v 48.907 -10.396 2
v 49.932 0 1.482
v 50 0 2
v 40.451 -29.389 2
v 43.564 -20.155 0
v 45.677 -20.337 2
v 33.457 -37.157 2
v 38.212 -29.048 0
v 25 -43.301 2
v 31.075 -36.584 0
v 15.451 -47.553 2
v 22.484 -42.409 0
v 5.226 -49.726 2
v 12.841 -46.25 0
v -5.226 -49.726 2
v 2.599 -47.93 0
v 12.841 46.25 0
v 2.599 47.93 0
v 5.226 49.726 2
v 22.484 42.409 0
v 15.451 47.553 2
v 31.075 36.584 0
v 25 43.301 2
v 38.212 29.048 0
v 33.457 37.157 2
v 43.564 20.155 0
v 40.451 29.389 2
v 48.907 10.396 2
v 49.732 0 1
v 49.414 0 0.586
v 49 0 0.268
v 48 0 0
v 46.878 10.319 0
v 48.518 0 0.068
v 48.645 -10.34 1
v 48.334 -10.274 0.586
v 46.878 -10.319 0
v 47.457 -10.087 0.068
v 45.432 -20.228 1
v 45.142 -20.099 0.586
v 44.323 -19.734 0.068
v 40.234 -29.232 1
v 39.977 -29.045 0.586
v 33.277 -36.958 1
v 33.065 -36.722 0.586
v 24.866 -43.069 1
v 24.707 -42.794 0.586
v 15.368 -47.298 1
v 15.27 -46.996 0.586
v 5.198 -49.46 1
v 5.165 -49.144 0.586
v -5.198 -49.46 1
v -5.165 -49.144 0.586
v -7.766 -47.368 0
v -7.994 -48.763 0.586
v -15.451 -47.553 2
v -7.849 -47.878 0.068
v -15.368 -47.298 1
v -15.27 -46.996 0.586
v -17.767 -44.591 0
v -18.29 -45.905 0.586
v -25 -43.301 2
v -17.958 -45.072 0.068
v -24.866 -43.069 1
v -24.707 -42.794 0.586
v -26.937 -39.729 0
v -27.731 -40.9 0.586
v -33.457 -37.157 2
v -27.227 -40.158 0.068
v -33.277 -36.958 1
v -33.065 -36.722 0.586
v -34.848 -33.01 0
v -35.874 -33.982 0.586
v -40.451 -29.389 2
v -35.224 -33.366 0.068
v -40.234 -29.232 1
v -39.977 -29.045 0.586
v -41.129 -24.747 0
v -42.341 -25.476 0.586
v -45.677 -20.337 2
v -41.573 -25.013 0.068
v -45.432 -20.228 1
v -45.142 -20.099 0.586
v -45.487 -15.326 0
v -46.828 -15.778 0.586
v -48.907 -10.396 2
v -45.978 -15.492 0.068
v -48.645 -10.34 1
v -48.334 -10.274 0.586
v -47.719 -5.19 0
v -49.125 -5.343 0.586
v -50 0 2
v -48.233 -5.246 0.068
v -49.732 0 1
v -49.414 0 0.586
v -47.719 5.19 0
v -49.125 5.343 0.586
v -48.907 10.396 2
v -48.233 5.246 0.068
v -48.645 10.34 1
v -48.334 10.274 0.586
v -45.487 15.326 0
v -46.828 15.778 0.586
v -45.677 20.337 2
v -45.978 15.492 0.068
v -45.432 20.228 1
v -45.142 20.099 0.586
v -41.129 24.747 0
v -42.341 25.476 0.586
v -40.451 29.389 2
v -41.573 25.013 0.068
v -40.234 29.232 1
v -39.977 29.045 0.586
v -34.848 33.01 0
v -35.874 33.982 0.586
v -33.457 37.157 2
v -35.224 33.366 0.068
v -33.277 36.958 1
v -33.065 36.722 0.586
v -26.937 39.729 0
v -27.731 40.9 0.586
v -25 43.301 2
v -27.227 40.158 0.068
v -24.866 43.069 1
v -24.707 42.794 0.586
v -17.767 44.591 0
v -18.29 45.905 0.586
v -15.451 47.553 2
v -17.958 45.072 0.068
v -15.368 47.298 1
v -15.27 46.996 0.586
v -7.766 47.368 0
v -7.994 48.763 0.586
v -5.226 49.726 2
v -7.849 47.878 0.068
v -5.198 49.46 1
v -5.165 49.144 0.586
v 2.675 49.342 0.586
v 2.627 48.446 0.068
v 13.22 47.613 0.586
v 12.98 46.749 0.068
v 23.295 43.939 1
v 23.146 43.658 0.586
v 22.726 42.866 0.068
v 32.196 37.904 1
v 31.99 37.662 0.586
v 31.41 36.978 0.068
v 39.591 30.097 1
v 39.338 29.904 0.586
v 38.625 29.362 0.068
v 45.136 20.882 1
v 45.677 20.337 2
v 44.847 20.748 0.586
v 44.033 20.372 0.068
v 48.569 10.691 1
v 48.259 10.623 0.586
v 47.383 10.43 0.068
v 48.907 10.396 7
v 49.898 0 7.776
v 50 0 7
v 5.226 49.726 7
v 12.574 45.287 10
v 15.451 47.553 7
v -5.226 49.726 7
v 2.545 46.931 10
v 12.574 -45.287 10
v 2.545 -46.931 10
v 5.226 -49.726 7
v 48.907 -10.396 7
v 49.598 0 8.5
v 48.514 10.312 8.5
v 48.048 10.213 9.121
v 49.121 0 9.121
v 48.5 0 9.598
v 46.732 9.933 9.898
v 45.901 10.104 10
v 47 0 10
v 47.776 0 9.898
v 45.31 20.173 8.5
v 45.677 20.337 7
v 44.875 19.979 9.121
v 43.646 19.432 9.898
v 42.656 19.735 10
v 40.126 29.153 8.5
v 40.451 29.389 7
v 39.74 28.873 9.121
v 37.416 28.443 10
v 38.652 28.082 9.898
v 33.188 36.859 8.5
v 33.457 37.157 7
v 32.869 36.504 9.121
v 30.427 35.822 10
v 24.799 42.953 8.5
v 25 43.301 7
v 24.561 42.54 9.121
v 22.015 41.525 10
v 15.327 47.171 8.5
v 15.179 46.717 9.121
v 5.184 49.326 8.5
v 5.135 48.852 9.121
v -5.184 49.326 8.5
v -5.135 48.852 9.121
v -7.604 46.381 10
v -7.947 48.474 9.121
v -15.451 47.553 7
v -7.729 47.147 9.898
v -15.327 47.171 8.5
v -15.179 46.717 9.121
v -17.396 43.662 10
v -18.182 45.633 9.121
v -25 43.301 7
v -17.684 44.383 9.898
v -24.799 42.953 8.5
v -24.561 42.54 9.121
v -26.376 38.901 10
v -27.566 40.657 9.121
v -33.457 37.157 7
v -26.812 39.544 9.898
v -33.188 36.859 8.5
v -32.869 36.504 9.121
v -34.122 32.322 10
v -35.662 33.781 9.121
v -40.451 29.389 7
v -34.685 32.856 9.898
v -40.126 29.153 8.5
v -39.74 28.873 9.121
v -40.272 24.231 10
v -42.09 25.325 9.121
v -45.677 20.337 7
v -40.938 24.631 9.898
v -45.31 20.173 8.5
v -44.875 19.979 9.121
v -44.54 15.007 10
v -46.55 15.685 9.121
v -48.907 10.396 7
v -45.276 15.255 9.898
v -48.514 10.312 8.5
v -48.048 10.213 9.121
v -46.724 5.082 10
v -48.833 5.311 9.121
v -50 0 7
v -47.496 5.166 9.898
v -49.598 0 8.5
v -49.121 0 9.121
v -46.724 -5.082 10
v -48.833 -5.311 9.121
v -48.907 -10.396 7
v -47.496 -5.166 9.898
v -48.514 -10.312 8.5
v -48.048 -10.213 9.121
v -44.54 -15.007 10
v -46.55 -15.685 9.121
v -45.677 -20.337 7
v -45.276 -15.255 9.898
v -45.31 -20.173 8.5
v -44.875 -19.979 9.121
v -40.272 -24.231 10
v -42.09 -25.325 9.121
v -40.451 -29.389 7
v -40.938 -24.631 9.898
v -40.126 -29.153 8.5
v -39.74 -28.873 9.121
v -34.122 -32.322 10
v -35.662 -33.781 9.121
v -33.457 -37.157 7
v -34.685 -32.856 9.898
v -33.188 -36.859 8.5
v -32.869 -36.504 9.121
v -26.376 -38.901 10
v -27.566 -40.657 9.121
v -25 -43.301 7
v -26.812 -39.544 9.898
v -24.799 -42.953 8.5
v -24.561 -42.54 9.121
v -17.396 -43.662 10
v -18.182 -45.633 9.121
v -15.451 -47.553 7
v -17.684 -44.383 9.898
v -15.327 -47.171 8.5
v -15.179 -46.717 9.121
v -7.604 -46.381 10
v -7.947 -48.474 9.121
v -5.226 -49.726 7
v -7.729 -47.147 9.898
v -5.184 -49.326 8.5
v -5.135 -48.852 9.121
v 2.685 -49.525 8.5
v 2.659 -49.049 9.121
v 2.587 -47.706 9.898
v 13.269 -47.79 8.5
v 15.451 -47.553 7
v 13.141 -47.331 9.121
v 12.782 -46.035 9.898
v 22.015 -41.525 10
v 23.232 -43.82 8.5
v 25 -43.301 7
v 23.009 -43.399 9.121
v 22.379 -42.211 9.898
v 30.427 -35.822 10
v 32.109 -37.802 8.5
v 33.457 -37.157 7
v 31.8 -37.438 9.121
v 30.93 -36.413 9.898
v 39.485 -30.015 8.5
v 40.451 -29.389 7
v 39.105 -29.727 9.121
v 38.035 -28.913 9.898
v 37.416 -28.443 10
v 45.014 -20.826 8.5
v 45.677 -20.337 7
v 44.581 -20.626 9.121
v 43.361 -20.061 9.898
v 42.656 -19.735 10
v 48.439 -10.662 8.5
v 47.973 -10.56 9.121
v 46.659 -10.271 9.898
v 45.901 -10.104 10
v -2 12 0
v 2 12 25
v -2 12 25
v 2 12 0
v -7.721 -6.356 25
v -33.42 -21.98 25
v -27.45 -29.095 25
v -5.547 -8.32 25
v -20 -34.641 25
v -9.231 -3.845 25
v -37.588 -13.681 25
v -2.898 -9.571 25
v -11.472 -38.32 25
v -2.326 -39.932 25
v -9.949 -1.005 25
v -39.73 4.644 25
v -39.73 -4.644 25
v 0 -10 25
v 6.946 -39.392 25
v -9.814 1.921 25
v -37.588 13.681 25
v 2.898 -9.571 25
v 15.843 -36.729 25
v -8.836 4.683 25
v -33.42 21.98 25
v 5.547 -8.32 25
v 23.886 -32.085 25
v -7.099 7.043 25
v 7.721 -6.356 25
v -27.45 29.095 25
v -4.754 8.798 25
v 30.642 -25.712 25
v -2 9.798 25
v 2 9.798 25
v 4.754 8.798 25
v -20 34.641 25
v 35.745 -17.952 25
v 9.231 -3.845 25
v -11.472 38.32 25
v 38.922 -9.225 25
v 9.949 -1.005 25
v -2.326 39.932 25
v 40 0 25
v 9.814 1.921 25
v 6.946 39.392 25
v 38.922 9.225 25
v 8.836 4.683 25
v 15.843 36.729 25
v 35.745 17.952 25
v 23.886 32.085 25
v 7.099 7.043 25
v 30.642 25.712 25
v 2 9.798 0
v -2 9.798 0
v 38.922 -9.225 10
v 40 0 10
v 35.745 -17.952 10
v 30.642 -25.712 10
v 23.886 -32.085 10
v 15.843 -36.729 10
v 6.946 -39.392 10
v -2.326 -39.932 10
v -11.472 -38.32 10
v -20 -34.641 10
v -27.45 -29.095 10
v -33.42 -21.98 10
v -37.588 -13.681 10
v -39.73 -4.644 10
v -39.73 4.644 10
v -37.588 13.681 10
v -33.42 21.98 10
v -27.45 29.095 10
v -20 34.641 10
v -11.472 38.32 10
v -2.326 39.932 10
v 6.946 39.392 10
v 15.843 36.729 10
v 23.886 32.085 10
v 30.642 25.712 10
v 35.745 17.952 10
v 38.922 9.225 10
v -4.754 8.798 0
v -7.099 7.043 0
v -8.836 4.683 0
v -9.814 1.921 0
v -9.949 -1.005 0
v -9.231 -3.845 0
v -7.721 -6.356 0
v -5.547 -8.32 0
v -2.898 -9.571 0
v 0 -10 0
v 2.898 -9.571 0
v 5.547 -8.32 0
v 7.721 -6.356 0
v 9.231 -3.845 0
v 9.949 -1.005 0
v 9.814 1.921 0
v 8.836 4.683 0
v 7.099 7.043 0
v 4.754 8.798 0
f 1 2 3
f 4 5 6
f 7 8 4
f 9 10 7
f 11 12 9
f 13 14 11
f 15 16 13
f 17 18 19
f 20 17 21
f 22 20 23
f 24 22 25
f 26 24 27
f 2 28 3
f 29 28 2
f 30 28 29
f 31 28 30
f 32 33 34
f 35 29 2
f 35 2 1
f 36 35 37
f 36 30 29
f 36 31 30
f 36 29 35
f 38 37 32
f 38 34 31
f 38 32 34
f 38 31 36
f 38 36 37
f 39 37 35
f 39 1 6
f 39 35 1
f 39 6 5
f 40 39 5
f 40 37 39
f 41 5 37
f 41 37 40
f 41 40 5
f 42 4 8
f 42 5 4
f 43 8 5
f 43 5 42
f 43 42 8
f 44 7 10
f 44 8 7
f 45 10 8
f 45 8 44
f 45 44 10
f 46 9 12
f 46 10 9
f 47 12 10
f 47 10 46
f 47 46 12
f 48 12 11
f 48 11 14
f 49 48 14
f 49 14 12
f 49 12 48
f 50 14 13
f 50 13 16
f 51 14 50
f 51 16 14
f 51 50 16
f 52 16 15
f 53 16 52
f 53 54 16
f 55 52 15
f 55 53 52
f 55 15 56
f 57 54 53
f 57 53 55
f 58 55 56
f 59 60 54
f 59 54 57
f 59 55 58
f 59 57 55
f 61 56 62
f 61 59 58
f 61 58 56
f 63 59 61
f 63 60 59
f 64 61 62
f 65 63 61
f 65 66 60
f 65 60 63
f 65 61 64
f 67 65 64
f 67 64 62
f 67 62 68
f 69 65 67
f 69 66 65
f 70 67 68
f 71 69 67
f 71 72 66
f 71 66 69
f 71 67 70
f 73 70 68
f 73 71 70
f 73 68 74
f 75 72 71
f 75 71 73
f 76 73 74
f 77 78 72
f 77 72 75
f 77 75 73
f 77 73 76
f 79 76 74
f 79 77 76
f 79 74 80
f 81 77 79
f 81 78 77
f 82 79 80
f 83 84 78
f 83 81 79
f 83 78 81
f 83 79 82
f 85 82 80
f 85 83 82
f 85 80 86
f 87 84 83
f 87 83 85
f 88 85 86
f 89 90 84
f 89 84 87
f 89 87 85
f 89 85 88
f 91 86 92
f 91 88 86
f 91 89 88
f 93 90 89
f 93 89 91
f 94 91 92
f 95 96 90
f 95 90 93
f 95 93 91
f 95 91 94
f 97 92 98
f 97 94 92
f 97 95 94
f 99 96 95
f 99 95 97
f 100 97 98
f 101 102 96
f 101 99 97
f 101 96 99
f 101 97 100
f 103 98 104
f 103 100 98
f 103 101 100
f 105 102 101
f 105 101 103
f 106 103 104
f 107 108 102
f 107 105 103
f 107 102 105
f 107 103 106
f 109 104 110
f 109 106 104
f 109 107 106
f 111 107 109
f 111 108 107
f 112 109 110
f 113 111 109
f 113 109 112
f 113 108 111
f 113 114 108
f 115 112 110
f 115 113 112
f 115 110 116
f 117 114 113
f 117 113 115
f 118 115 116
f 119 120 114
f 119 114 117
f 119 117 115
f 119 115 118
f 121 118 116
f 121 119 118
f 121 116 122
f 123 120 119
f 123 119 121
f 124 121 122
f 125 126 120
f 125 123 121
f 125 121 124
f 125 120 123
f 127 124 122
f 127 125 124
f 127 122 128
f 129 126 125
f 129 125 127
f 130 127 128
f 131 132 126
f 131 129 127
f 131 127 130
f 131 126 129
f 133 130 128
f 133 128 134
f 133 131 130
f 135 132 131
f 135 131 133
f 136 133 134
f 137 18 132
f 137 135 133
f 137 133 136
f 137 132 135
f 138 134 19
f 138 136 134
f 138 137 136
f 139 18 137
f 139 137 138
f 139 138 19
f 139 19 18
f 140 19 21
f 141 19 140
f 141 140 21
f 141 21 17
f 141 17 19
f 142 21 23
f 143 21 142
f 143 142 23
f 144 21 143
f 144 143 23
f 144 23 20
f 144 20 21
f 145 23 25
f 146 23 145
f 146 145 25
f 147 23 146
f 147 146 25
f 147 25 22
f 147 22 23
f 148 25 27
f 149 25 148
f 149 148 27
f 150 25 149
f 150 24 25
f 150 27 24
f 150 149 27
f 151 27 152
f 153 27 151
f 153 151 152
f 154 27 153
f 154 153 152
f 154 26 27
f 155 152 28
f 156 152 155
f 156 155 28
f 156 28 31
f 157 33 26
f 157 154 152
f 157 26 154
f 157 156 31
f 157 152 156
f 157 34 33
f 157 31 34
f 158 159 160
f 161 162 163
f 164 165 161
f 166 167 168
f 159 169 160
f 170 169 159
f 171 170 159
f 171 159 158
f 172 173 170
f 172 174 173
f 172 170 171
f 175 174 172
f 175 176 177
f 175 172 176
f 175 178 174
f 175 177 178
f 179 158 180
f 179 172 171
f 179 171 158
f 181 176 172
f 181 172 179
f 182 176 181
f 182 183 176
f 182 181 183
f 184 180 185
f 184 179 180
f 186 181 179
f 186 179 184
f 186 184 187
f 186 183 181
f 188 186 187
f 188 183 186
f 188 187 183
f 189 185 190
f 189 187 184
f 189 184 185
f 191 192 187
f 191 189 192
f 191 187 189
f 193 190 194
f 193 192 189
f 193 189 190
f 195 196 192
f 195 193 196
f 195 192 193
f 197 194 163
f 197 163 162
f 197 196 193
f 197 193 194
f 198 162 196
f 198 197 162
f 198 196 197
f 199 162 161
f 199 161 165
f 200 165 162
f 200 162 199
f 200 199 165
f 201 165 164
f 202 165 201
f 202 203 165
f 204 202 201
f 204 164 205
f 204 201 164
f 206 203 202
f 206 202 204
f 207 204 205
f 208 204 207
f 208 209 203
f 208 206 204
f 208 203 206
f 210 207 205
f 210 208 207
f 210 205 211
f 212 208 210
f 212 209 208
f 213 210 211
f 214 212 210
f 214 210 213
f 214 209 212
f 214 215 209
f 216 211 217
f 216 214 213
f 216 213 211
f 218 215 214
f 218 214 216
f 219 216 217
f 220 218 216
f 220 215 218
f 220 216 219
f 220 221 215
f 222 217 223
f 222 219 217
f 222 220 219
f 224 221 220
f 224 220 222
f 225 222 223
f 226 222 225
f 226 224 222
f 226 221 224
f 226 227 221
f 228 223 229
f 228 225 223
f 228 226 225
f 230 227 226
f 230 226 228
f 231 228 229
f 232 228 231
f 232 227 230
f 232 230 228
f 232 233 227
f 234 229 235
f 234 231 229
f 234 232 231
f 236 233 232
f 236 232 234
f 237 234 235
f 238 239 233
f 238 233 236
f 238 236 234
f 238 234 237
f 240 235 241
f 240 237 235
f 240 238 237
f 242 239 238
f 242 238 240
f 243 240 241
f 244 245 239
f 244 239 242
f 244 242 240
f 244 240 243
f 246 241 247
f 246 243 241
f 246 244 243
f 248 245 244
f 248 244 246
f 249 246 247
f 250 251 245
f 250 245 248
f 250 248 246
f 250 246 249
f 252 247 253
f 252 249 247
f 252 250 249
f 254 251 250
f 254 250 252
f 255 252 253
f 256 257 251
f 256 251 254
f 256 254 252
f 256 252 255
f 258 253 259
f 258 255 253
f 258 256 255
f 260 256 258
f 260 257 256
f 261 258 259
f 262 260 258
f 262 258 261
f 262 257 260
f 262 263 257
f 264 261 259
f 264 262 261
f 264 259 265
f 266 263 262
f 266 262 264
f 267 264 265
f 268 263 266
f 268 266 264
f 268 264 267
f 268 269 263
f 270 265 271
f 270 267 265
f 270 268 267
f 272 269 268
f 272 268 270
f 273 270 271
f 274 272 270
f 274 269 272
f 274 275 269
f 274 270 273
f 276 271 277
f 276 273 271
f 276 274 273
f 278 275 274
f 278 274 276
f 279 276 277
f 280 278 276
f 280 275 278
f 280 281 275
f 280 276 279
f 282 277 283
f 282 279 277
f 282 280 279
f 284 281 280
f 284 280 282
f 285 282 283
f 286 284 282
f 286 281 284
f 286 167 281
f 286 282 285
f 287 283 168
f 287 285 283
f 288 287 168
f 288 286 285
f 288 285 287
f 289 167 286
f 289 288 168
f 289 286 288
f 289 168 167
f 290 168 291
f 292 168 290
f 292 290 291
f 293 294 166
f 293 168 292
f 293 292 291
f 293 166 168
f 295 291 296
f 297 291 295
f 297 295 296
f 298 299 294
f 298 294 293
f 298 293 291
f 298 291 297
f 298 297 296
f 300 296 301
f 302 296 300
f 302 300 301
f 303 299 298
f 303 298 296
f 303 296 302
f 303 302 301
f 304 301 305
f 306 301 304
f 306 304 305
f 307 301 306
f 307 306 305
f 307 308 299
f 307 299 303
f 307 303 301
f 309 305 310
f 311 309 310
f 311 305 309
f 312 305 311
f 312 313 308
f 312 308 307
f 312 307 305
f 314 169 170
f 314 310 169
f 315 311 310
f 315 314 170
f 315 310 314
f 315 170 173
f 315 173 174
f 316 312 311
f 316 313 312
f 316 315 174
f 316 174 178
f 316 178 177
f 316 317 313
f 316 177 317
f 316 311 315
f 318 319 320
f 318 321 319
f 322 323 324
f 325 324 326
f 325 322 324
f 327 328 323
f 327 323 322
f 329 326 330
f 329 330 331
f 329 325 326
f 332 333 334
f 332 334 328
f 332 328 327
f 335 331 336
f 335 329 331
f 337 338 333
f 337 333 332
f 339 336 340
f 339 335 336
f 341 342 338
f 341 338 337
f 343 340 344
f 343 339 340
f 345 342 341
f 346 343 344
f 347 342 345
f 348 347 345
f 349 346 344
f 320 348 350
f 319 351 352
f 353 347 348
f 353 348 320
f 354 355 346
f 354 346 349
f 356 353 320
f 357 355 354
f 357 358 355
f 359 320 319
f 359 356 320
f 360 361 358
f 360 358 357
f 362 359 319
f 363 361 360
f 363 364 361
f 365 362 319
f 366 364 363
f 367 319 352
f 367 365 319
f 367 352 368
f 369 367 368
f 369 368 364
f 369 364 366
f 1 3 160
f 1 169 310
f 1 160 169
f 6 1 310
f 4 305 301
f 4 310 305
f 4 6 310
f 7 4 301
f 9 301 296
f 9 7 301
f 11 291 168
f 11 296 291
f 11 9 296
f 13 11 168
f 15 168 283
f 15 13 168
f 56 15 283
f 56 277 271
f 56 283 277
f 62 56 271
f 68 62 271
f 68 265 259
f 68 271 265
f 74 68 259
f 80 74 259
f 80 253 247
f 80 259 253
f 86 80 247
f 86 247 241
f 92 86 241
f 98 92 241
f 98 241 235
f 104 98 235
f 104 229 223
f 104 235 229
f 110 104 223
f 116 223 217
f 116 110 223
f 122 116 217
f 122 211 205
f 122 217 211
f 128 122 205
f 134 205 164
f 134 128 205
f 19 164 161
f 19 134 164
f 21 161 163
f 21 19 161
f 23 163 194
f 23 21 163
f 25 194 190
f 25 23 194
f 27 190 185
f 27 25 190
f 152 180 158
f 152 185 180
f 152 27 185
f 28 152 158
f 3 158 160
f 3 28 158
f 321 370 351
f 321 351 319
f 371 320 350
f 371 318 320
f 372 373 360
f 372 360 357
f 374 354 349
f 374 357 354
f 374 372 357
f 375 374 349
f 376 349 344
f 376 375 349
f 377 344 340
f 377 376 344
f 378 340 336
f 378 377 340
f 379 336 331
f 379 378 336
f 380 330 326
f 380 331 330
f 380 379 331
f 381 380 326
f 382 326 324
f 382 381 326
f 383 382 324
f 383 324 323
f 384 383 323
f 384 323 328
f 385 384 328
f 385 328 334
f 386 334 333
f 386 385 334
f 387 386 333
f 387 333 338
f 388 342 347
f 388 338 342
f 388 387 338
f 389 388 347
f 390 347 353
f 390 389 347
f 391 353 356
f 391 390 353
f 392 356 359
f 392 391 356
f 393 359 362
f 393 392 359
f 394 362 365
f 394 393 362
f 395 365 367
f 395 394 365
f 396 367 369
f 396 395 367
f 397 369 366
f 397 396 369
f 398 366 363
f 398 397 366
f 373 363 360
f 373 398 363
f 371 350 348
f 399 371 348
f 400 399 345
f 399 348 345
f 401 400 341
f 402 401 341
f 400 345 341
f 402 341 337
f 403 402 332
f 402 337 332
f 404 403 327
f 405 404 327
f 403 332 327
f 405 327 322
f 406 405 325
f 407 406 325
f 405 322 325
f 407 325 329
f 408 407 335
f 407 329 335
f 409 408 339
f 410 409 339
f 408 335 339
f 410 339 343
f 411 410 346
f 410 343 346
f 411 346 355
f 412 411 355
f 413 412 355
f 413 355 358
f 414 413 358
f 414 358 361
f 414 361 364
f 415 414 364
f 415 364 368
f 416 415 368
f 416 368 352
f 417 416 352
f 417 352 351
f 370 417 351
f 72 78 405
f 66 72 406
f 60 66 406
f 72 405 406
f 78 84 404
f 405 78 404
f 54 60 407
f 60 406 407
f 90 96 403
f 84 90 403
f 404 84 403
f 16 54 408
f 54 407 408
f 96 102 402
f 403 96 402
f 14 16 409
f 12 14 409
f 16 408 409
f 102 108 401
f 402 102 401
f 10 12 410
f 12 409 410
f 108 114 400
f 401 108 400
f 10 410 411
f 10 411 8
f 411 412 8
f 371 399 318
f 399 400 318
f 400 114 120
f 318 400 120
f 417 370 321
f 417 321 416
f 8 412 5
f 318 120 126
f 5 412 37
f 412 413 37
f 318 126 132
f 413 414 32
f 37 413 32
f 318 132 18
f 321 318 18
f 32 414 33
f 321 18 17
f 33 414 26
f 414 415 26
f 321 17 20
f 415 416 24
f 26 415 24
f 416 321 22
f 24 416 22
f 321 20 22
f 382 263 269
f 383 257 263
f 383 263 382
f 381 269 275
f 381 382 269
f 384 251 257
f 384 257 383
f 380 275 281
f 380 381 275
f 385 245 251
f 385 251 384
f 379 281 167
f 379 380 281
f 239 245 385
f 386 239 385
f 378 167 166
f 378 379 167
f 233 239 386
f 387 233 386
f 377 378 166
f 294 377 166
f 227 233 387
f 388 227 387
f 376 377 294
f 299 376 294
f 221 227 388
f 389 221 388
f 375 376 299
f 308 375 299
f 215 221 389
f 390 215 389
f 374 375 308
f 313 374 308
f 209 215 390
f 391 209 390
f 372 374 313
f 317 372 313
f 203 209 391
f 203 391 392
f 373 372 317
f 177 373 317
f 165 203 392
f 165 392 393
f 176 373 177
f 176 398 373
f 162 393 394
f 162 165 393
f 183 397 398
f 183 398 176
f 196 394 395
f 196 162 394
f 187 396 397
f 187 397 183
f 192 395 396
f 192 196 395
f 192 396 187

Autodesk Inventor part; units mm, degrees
ref_plane "YZ Plane" through (0, 0, 0) normal (1, 0, 0) x (0, 1, 0)
ref_plane "XZ Plane" through (0, 0, 0) normal (0, 1, 0) x (-1, 0, 0)
ref_plane "XY Plane" through (0, 0, 0) normal (0, 0, 1) x (1, 0, 0)
sketch "Sketch1" plane through (0, 0, 0) normal (0, 0, 1) x (1, 0, 0)
  circle A0 centre (0, 0) radius 50
  dimension "d0" = 100
extrude "Extrusion1" add sketch "Sketch1" along normal blind 10
sketch "Sketch2" plane through (0, 0, 10) normal (0, 0, 1) x (1, 0, 0)
  circle A0 centre (0, 0) radius 40
  dimension "d3" = 80
extrude "Extrusion2" add sketch "Sketch2" along normal blind 15
fillet "Fillet1" radius 3 1 edges at (-50, 0, 10)
sketch "Sketch3" plane through (0, 0, 0) normal (0, 0, -1) x (-1, 0, 0)
  point P0 (0, 0)
  point P1 (0, 0)
hole "Hole1" at (0, 0, 0) direction (0, 0, 1) diameter 20 end through all
fillet "Fillet2" radius 2 1 edges at (-50, 0, 0)
sketch "Sketch5" plane through (0, 0, 0) normal (0, 0, -1) x (-1, 0, 0)
  circle A0 centre (0, 0) radius 10 projected
  line L0 (-2, 12) -> (2, 12)
  line L1 (2, 12) -> (2, 8)
  line L2 (2, 8) -> (-2, 8)
  line L3 (-2, 8) -> (-2, 12)
  point P0 (-2, 10)
  point P1 (-2, 9.798)
  point P2 (2, 9.798)
  dimension "d19" = 4
  dimension "d20" = 4
  dimension "d21" = 2
  dimension "d22" = 12
extrude "Extrusion4" cut sketch "Sketch5" against normal through all contours A0 L3 L0 L1
properties part number "P204" material "Aluminum 6061"
